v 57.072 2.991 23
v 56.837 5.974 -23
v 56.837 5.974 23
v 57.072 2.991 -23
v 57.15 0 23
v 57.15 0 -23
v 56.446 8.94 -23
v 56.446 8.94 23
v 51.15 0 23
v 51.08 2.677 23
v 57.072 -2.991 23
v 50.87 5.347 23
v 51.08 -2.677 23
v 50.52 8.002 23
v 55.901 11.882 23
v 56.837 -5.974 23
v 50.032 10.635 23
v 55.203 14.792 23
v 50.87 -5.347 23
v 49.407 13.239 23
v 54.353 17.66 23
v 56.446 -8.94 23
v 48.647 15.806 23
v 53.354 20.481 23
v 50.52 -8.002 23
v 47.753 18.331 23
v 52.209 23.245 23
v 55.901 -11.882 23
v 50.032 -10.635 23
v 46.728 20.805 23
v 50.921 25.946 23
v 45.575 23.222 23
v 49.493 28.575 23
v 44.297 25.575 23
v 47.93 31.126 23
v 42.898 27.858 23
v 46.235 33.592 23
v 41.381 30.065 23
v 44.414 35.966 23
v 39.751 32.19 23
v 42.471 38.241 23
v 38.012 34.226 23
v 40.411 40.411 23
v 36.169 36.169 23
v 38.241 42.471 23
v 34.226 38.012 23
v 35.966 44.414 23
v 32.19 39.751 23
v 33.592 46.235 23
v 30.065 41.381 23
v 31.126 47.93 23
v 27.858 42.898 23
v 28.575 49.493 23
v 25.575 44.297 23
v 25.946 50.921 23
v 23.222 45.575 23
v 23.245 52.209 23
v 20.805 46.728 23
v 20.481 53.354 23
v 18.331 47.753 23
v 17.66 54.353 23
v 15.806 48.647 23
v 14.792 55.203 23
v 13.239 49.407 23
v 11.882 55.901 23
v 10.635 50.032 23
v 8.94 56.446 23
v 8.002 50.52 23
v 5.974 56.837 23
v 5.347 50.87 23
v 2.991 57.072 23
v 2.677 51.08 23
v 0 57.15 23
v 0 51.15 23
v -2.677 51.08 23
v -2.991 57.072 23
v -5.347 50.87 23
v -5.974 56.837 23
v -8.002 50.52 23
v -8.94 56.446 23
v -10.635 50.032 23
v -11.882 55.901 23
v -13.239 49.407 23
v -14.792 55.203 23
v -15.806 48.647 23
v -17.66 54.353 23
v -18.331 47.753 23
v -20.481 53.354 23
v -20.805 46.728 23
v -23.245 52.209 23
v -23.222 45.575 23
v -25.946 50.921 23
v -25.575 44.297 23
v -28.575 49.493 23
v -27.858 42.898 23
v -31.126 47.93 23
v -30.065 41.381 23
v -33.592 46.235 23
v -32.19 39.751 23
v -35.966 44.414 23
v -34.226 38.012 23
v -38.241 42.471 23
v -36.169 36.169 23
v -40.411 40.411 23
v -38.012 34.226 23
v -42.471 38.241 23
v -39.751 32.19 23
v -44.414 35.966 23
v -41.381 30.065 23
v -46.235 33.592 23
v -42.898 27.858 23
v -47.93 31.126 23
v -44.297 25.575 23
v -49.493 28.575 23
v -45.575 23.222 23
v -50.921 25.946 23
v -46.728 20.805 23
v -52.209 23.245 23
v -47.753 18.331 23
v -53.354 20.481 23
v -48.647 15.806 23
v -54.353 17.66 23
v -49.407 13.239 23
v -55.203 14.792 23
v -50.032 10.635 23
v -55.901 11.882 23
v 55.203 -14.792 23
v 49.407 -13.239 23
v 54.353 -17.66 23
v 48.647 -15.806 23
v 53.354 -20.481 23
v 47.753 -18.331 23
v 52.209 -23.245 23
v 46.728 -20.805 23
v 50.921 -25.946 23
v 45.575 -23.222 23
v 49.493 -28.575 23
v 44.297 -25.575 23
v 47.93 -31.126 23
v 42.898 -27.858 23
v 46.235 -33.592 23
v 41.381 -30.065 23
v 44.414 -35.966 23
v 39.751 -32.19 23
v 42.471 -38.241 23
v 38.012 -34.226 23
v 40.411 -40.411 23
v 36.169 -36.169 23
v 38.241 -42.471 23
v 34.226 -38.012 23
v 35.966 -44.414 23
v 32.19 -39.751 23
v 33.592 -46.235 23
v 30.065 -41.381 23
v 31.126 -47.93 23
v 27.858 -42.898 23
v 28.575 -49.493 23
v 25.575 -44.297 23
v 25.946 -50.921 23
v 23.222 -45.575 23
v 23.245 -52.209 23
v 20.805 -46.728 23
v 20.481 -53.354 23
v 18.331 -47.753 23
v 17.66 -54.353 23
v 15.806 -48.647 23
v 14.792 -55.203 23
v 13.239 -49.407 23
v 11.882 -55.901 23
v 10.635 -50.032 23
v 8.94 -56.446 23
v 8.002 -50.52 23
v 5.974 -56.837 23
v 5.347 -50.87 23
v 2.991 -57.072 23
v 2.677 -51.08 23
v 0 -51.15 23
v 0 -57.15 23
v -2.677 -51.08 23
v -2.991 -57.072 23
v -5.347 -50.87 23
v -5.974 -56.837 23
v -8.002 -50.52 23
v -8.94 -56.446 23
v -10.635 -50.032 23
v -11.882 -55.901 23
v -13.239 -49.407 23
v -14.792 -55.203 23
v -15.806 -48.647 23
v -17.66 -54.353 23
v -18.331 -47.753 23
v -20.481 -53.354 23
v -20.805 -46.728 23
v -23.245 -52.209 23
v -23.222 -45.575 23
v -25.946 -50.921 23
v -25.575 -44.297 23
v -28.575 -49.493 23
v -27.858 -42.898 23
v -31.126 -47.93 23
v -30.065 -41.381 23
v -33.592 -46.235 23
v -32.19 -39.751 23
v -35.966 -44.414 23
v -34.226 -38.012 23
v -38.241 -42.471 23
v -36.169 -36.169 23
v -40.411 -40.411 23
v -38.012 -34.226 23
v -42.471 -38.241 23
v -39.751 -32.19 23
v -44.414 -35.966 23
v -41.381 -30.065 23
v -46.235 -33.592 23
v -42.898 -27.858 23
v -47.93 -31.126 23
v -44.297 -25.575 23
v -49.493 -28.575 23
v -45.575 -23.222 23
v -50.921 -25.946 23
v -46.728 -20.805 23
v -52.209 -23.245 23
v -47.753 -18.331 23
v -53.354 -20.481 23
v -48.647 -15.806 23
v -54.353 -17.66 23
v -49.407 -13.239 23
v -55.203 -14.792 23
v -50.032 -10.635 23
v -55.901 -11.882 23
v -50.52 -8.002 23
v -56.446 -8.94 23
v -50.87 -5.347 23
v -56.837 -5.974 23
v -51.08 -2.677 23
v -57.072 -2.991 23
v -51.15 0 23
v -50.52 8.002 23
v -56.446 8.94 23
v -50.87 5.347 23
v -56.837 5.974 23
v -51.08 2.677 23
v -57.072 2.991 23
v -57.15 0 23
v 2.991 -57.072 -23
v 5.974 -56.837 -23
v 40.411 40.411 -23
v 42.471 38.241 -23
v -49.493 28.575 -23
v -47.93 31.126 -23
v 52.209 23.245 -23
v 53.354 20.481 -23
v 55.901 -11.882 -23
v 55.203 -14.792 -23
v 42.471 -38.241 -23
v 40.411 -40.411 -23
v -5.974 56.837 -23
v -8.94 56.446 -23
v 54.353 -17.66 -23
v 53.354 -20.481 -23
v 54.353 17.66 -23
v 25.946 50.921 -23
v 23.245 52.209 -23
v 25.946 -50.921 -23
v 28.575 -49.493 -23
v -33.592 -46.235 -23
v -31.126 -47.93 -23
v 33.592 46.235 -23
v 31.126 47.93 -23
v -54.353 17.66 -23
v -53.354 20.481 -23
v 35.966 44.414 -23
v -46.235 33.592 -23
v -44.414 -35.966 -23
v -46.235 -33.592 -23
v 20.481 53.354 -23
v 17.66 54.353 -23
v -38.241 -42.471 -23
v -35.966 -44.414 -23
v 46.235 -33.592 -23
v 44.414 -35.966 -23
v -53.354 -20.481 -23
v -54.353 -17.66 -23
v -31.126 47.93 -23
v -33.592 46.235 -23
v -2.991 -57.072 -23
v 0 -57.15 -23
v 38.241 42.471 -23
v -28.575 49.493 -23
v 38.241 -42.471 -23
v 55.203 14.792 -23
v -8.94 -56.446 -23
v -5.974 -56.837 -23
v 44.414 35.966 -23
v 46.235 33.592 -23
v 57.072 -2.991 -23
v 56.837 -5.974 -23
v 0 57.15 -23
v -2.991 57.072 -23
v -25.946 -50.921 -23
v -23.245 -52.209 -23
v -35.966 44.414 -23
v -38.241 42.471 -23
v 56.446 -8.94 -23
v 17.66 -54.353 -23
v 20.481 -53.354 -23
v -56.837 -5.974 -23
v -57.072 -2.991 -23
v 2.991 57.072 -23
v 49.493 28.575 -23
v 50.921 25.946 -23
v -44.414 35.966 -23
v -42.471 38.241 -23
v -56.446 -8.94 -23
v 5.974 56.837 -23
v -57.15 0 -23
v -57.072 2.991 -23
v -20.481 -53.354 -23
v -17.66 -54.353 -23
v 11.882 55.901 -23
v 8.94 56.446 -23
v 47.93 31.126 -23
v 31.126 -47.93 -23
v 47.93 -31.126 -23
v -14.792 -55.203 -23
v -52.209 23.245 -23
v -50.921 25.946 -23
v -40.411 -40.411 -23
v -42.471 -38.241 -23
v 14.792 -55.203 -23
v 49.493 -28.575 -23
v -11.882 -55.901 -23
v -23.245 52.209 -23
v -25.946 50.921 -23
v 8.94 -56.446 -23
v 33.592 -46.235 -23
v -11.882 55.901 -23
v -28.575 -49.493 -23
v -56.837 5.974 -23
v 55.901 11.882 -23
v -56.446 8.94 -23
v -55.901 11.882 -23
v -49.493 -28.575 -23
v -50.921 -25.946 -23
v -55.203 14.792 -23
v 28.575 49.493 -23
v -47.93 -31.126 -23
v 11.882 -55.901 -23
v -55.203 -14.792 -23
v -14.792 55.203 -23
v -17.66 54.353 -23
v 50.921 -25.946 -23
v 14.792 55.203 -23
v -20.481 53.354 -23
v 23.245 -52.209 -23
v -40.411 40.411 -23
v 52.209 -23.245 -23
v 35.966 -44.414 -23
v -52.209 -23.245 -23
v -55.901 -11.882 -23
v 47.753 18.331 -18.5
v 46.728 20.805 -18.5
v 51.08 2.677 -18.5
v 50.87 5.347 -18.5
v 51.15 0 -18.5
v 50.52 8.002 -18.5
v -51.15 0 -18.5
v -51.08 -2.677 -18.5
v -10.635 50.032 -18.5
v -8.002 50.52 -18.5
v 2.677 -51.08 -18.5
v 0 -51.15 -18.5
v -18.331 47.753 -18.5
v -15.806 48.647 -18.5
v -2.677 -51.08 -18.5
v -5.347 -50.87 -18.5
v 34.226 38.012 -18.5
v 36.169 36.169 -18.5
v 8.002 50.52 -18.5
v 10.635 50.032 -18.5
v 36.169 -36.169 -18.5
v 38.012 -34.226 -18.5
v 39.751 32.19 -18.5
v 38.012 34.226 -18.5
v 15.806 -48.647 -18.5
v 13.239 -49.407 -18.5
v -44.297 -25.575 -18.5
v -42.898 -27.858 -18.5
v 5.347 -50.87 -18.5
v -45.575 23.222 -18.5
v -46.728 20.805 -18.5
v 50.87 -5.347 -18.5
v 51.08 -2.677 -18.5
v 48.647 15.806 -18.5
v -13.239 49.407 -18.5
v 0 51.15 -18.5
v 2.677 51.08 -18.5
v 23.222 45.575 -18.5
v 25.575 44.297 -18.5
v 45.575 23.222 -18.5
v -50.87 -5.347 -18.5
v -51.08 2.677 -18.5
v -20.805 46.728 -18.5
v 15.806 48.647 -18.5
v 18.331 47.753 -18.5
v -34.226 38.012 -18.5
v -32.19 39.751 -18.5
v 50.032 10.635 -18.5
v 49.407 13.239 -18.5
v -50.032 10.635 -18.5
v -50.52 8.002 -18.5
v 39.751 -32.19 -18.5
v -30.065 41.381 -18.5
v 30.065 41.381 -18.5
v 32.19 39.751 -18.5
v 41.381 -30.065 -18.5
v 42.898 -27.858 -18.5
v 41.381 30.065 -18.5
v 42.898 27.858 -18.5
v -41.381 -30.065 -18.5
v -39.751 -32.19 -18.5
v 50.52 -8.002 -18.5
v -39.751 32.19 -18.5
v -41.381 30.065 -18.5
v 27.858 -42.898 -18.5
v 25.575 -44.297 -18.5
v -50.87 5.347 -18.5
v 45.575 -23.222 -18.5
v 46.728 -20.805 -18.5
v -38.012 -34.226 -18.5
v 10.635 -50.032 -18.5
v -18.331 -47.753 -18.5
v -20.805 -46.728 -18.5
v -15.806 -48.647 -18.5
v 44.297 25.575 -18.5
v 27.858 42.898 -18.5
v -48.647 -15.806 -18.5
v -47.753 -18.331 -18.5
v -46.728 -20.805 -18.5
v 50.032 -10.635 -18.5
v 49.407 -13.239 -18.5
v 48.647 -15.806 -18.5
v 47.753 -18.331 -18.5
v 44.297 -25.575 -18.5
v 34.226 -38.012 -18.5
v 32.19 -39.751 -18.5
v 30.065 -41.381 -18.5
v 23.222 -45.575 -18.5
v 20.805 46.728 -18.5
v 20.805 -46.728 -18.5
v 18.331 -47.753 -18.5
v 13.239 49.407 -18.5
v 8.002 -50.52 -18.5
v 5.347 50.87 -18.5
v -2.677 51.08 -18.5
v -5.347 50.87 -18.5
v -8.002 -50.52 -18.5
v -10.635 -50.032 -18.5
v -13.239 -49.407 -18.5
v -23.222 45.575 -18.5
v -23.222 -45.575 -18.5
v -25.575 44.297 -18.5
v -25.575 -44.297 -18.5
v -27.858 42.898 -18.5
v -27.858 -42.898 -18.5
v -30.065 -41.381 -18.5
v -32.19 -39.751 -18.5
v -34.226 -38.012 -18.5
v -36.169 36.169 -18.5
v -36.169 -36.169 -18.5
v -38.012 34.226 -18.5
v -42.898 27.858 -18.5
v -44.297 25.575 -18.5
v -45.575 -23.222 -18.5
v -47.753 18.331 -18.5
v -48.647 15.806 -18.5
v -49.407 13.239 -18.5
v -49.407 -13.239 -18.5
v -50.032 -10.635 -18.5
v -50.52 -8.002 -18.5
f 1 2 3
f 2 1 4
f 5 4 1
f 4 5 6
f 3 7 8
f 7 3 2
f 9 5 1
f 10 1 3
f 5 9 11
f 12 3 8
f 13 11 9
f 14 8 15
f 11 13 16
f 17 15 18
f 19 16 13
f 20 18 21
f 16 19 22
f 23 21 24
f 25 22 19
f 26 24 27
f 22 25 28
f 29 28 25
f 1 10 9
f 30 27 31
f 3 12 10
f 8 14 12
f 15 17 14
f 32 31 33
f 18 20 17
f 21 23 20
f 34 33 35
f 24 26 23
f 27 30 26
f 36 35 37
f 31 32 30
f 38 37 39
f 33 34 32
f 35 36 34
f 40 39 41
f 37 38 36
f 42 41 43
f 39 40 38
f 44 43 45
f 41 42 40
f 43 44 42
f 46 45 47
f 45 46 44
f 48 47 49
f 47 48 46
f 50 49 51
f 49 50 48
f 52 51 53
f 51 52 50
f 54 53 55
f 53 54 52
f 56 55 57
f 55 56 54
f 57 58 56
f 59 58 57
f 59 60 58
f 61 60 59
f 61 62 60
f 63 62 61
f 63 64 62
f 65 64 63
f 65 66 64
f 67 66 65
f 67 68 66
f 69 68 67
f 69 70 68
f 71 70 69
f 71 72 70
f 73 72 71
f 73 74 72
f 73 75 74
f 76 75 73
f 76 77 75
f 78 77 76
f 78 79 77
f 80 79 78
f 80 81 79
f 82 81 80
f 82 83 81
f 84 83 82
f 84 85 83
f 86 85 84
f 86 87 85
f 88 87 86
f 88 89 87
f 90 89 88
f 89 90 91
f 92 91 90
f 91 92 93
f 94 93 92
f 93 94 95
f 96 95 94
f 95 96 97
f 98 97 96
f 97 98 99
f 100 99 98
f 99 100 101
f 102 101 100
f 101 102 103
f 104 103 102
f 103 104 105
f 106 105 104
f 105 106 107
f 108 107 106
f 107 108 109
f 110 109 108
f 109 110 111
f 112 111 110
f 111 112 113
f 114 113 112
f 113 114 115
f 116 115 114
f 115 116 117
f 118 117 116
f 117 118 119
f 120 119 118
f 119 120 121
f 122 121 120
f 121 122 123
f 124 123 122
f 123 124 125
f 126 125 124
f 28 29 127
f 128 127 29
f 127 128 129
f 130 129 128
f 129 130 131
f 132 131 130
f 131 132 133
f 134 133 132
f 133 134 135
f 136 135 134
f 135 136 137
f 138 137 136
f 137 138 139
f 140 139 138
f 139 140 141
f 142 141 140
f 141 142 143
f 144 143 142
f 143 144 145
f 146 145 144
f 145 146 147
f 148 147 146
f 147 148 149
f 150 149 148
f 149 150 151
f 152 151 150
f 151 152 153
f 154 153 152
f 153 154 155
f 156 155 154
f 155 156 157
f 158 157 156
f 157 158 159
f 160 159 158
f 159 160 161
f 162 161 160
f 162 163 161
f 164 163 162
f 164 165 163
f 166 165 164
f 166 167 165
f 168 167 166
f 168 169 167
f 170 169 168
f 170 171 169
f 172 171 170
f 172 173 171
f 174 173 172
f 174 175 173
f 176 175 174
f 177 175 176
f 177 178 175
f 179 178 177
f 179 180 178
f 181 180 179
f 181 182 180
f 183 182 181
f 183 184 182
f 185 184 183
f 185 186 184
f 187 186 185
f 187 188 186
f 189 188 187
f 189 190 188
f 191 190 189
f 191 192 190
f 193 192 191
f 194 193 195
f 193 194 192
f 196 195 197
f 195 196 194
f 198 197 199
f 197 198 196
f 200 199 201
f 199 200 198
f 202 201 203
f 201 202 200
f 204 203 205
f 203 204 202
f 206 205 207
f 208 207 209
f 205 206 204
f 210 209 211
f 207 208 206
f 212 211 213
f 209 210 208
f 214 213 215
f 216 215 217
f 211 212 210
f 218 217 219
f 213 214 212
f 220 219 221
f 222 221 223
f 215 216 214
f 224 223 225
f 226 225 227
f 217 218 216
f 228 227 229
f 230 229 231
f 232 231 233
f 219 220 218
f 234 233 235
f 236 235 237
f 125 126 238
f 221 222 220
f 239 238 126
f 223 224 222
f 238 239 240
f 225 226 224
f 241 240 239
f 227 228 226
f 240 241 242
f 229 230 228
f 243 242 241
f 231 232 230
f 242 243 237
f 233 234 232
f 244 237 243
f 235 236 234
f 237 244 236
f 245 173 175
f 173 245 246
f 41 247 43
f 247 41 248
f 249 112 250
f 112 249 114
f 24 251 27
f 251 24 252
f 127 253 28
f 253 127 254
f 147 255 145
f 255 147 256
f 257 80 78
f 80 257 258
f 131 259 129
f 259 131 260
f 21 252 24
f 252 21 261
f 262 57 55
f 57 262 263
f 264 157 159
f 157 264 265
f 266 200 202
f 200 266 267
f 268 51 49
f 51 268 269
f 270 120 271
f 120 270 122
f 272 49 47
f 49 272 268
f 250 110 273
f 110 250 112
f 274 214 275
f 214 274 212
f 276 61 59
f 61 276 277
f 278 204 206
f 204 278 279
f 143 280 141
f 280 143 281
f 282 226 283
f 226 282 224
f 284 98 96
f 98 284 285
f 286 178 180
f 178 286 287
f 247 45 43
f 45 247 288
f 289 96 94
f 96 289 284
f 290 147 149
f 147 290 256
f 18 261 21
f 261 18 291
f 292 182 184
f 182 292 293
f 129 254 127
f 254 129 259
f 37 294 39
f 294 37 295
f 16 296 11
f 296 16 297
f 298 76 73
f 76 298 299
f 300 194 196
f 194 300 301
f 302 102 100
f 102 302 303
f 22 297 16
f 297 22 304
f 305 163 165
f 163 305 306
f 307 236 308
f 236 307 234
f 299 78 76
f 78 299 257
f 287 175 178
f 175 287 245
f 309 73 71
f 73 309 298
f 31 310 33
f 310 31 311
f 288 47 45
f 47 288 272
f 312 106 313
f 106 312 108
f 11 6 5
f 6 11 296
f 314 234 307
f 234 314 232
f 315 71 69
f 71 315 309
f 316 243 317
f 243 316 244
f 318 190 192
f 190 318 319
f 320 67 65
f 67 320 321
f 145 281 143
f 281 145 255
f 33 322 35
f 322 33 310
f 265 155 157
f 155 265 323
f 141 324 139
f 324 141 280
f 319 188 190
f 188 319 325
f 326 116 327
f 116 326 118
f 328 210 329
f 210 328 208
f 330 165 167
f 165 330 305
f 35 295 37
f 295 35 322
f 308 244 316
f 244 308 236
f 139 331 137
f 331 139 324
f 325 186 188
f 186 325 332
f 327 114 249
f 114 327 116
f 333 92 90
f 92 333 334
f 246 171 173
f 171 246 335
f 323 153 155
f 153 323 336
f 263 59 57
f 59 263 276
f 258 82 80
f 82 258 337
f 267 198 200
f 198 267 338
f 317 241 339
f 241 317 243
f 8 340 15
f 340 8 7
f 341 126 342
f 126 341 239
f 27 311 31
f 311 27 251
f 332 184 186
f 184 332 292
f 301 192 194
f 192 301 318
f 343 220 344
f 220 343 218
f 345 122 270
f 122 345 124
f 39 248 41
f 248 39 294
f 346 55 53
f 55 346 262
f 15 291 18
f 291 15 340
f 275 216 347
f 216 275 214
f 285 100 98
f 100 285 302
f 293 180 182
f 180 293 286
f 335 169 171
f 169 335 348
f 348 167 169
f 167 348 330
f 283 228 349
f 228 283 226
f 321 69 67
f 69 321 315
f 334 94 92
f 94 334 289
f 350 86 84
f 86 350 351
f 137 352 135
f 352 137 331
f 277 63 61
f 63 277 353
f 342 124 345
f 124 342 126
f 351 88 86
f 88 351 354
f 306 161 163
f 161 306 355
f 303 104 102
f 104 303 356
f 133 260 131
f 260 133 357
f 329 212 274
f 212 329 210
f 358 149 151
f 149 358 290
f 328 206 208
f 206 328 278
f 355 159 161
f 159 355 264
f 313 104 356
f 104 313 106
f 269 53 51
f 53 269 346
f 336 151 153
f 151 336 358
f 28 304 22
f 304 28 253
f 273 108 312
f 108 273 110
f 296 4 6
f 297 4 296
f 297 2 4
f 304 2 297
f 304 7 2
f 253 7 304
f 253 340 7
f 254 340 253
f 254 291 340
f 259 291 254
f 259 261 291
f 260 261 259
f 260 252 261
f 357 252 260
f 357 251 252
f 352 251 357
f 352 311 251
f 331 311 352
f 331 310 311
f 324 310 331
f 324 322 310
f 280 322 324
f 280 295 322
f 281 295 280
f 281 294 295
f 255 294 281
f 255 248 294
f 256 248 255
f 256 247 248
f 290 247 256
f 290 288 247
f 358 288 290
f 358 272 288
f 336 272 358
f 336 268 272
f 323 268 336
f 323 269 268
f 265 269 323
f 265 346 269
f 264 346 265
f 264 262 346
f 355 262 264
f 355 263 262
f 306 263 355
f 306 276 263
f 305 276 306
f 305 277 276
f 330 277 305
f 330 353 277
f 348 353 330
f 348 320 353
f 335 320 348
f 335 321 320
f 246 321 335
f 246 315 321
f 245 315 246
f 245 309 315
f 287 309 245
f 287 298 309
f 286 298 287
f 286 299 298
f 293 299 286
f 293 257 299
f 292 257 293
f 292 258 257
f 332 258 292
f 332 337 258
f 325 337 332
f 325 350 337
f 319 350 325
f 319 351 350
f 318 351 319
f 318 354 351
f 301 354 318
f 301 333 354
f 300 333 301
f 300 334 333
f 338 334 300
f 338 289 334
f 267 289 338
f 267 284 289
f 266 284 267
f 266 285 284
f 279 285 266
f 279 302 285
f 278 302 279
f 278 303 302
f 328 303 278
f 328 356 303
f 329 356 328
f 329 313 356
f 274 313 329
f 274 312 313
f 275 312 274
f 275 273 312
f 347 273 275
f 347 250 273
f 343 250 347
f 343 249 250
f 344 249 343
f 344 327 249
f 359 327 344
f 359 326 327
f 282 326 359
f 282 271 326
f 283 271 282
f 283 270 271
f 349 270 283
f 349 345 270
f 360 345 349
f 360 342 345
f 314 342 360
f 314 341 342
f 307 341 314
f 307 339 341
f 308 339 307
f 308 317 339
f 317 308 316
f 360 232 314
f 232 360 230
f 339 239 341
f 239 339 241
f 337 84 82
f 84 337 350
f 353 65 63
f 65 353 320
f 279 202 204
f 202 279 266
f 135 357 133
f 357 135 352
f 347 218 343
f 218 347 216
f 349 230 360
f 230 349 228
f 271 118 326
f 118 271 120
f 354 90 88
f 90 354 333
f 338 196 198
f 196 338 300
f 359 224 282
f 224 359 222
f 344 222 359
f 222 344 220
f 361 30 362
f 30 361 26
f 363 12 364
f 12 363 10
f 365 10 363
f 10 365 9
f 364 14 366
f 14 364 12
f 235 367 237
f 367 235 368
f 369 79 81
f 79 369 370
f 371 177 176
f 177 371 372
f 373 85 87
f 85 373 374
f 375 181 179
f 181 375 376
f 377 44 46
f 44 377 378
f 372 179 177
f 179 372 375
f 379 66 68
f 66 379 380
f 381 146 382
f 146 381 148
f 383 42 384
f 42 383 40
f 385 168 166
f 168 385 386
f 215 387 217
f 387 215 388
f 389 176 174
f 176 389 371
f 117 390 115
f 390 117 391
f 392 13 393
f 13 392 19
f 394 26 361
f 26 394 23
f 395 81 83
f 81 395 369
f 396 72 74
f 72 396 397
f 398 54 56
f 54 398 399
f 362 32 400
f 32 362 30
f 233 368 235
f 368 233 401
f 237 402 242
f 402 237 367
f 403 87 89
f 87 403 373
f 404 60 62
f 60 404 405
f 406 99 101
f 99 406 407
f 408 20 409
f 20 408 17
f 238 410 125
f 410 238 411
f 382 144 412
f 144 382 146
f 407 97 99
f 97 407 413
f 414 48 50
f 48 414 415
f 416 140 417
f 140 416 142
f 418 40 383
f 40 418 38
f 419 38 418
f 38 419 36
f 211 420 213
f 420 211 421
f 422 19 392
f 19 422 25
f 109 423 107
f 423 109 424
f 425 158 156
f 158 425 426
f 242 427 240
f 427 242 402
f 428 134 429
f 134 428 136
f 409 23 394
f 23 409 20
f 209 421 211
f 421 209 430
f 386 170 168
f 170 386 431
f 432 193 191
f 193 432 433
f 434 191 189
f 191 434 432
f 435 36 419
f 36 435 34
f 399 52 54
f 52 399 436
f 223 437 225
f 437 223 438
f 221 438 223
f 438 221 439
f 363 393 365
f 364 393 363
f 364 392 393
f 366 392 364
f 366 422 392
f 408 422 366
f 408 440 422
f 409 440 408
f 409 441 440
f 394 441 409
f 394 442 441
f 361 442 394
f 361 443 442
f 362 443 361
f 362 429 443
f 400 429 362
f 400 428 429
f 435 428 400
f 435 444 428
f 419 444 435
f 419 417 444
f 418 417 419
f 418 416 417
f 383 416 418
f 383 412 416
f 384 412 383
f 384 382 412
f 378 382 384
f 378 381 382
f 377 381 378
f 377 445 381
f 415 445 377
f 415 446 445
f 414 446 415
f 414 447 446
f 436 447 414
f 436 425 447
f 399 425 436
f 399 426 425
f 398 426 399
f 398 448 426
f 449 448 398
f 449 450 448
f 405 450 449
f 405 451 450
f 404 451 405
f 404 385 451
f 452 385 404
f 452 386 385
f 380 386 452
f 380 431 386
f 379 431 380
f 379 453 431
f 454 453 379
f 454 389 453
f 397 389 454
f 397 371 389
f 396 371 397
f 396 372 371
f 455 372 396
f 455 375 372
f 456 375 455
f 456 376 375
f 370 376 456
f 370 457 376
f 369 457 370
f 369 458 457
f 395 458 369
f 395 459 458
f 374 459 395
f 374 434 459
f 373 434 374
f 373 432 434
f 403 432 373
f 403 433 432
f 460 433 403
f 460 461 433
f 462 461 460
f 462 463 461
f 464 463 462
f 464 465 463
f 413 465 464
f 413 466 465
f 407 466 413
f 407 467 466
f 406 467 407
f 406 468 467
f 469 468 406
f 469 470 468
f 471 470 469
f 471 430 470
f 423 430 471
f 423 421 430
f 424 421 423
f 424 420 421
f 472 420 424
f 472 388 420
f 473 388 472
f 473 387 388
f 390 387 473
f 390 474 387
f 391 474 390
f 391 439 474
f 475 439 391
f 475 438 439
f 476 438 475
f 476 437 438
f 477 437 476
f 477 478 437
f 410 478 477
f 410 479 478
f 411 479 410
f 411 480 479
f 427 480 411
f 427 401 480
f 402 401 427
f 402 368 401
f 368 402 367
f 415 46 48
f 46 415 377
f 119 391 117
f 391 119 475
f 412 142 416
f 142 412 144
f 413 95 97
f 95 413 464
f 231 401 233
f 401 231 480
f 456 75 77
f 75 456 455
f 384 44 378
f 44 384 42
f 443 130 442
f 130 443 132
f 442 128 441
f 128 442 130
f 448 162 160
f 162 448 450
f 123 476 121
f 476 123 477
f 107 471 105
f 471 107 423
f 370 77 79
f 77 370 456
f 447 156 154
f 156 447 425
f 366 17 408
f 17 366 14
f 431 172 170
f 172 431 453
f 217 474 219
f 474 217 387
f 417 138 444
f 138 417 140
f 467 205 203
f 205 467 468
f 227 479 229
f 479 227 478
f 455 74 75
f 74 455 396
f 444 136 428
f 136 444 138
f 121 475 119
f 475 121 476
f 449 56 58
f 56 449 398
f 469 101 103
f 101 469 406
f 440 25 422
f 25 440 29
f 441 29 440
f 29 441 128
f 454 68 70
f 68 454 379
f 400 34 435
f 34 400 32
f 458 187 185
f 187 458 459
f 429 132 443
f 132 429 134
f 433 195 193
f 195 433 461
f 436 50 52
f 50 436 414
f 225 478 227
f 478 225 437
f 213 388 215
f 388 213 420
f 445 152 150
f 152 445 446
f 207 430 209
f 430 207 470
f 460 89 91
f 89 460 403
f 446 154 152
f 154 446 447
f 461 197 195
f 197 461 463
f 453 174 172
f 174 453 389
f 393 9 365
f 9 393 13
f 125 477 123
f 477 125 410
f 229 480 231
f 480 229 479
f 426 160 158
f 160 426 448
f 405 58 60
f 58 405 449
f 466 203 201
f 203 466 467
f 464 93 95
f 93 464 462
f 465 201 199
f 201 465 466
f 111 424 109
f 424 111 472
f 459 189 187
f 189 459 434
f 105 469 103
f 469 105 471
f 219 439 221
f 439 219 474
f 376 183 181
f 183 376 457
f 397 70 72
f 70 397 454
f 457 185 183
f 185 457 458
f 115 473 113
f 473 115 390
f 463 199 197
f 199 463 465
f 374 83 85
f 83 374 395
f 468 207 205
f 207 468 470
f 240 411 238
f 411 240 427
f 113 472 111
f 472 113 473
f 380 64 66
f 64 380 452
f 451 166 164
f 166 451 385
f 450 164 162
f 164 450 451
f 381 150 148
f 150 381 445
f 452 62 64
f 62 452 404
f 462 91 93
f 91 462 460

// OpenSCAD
//dimensions are in mm 
$fn=120;
difference(){
cylinder(h = 46, r=57.15, center = true);
    translate([0,0,-18.5])
    cylinder(h = 42, r=51.15, center = false);
}
